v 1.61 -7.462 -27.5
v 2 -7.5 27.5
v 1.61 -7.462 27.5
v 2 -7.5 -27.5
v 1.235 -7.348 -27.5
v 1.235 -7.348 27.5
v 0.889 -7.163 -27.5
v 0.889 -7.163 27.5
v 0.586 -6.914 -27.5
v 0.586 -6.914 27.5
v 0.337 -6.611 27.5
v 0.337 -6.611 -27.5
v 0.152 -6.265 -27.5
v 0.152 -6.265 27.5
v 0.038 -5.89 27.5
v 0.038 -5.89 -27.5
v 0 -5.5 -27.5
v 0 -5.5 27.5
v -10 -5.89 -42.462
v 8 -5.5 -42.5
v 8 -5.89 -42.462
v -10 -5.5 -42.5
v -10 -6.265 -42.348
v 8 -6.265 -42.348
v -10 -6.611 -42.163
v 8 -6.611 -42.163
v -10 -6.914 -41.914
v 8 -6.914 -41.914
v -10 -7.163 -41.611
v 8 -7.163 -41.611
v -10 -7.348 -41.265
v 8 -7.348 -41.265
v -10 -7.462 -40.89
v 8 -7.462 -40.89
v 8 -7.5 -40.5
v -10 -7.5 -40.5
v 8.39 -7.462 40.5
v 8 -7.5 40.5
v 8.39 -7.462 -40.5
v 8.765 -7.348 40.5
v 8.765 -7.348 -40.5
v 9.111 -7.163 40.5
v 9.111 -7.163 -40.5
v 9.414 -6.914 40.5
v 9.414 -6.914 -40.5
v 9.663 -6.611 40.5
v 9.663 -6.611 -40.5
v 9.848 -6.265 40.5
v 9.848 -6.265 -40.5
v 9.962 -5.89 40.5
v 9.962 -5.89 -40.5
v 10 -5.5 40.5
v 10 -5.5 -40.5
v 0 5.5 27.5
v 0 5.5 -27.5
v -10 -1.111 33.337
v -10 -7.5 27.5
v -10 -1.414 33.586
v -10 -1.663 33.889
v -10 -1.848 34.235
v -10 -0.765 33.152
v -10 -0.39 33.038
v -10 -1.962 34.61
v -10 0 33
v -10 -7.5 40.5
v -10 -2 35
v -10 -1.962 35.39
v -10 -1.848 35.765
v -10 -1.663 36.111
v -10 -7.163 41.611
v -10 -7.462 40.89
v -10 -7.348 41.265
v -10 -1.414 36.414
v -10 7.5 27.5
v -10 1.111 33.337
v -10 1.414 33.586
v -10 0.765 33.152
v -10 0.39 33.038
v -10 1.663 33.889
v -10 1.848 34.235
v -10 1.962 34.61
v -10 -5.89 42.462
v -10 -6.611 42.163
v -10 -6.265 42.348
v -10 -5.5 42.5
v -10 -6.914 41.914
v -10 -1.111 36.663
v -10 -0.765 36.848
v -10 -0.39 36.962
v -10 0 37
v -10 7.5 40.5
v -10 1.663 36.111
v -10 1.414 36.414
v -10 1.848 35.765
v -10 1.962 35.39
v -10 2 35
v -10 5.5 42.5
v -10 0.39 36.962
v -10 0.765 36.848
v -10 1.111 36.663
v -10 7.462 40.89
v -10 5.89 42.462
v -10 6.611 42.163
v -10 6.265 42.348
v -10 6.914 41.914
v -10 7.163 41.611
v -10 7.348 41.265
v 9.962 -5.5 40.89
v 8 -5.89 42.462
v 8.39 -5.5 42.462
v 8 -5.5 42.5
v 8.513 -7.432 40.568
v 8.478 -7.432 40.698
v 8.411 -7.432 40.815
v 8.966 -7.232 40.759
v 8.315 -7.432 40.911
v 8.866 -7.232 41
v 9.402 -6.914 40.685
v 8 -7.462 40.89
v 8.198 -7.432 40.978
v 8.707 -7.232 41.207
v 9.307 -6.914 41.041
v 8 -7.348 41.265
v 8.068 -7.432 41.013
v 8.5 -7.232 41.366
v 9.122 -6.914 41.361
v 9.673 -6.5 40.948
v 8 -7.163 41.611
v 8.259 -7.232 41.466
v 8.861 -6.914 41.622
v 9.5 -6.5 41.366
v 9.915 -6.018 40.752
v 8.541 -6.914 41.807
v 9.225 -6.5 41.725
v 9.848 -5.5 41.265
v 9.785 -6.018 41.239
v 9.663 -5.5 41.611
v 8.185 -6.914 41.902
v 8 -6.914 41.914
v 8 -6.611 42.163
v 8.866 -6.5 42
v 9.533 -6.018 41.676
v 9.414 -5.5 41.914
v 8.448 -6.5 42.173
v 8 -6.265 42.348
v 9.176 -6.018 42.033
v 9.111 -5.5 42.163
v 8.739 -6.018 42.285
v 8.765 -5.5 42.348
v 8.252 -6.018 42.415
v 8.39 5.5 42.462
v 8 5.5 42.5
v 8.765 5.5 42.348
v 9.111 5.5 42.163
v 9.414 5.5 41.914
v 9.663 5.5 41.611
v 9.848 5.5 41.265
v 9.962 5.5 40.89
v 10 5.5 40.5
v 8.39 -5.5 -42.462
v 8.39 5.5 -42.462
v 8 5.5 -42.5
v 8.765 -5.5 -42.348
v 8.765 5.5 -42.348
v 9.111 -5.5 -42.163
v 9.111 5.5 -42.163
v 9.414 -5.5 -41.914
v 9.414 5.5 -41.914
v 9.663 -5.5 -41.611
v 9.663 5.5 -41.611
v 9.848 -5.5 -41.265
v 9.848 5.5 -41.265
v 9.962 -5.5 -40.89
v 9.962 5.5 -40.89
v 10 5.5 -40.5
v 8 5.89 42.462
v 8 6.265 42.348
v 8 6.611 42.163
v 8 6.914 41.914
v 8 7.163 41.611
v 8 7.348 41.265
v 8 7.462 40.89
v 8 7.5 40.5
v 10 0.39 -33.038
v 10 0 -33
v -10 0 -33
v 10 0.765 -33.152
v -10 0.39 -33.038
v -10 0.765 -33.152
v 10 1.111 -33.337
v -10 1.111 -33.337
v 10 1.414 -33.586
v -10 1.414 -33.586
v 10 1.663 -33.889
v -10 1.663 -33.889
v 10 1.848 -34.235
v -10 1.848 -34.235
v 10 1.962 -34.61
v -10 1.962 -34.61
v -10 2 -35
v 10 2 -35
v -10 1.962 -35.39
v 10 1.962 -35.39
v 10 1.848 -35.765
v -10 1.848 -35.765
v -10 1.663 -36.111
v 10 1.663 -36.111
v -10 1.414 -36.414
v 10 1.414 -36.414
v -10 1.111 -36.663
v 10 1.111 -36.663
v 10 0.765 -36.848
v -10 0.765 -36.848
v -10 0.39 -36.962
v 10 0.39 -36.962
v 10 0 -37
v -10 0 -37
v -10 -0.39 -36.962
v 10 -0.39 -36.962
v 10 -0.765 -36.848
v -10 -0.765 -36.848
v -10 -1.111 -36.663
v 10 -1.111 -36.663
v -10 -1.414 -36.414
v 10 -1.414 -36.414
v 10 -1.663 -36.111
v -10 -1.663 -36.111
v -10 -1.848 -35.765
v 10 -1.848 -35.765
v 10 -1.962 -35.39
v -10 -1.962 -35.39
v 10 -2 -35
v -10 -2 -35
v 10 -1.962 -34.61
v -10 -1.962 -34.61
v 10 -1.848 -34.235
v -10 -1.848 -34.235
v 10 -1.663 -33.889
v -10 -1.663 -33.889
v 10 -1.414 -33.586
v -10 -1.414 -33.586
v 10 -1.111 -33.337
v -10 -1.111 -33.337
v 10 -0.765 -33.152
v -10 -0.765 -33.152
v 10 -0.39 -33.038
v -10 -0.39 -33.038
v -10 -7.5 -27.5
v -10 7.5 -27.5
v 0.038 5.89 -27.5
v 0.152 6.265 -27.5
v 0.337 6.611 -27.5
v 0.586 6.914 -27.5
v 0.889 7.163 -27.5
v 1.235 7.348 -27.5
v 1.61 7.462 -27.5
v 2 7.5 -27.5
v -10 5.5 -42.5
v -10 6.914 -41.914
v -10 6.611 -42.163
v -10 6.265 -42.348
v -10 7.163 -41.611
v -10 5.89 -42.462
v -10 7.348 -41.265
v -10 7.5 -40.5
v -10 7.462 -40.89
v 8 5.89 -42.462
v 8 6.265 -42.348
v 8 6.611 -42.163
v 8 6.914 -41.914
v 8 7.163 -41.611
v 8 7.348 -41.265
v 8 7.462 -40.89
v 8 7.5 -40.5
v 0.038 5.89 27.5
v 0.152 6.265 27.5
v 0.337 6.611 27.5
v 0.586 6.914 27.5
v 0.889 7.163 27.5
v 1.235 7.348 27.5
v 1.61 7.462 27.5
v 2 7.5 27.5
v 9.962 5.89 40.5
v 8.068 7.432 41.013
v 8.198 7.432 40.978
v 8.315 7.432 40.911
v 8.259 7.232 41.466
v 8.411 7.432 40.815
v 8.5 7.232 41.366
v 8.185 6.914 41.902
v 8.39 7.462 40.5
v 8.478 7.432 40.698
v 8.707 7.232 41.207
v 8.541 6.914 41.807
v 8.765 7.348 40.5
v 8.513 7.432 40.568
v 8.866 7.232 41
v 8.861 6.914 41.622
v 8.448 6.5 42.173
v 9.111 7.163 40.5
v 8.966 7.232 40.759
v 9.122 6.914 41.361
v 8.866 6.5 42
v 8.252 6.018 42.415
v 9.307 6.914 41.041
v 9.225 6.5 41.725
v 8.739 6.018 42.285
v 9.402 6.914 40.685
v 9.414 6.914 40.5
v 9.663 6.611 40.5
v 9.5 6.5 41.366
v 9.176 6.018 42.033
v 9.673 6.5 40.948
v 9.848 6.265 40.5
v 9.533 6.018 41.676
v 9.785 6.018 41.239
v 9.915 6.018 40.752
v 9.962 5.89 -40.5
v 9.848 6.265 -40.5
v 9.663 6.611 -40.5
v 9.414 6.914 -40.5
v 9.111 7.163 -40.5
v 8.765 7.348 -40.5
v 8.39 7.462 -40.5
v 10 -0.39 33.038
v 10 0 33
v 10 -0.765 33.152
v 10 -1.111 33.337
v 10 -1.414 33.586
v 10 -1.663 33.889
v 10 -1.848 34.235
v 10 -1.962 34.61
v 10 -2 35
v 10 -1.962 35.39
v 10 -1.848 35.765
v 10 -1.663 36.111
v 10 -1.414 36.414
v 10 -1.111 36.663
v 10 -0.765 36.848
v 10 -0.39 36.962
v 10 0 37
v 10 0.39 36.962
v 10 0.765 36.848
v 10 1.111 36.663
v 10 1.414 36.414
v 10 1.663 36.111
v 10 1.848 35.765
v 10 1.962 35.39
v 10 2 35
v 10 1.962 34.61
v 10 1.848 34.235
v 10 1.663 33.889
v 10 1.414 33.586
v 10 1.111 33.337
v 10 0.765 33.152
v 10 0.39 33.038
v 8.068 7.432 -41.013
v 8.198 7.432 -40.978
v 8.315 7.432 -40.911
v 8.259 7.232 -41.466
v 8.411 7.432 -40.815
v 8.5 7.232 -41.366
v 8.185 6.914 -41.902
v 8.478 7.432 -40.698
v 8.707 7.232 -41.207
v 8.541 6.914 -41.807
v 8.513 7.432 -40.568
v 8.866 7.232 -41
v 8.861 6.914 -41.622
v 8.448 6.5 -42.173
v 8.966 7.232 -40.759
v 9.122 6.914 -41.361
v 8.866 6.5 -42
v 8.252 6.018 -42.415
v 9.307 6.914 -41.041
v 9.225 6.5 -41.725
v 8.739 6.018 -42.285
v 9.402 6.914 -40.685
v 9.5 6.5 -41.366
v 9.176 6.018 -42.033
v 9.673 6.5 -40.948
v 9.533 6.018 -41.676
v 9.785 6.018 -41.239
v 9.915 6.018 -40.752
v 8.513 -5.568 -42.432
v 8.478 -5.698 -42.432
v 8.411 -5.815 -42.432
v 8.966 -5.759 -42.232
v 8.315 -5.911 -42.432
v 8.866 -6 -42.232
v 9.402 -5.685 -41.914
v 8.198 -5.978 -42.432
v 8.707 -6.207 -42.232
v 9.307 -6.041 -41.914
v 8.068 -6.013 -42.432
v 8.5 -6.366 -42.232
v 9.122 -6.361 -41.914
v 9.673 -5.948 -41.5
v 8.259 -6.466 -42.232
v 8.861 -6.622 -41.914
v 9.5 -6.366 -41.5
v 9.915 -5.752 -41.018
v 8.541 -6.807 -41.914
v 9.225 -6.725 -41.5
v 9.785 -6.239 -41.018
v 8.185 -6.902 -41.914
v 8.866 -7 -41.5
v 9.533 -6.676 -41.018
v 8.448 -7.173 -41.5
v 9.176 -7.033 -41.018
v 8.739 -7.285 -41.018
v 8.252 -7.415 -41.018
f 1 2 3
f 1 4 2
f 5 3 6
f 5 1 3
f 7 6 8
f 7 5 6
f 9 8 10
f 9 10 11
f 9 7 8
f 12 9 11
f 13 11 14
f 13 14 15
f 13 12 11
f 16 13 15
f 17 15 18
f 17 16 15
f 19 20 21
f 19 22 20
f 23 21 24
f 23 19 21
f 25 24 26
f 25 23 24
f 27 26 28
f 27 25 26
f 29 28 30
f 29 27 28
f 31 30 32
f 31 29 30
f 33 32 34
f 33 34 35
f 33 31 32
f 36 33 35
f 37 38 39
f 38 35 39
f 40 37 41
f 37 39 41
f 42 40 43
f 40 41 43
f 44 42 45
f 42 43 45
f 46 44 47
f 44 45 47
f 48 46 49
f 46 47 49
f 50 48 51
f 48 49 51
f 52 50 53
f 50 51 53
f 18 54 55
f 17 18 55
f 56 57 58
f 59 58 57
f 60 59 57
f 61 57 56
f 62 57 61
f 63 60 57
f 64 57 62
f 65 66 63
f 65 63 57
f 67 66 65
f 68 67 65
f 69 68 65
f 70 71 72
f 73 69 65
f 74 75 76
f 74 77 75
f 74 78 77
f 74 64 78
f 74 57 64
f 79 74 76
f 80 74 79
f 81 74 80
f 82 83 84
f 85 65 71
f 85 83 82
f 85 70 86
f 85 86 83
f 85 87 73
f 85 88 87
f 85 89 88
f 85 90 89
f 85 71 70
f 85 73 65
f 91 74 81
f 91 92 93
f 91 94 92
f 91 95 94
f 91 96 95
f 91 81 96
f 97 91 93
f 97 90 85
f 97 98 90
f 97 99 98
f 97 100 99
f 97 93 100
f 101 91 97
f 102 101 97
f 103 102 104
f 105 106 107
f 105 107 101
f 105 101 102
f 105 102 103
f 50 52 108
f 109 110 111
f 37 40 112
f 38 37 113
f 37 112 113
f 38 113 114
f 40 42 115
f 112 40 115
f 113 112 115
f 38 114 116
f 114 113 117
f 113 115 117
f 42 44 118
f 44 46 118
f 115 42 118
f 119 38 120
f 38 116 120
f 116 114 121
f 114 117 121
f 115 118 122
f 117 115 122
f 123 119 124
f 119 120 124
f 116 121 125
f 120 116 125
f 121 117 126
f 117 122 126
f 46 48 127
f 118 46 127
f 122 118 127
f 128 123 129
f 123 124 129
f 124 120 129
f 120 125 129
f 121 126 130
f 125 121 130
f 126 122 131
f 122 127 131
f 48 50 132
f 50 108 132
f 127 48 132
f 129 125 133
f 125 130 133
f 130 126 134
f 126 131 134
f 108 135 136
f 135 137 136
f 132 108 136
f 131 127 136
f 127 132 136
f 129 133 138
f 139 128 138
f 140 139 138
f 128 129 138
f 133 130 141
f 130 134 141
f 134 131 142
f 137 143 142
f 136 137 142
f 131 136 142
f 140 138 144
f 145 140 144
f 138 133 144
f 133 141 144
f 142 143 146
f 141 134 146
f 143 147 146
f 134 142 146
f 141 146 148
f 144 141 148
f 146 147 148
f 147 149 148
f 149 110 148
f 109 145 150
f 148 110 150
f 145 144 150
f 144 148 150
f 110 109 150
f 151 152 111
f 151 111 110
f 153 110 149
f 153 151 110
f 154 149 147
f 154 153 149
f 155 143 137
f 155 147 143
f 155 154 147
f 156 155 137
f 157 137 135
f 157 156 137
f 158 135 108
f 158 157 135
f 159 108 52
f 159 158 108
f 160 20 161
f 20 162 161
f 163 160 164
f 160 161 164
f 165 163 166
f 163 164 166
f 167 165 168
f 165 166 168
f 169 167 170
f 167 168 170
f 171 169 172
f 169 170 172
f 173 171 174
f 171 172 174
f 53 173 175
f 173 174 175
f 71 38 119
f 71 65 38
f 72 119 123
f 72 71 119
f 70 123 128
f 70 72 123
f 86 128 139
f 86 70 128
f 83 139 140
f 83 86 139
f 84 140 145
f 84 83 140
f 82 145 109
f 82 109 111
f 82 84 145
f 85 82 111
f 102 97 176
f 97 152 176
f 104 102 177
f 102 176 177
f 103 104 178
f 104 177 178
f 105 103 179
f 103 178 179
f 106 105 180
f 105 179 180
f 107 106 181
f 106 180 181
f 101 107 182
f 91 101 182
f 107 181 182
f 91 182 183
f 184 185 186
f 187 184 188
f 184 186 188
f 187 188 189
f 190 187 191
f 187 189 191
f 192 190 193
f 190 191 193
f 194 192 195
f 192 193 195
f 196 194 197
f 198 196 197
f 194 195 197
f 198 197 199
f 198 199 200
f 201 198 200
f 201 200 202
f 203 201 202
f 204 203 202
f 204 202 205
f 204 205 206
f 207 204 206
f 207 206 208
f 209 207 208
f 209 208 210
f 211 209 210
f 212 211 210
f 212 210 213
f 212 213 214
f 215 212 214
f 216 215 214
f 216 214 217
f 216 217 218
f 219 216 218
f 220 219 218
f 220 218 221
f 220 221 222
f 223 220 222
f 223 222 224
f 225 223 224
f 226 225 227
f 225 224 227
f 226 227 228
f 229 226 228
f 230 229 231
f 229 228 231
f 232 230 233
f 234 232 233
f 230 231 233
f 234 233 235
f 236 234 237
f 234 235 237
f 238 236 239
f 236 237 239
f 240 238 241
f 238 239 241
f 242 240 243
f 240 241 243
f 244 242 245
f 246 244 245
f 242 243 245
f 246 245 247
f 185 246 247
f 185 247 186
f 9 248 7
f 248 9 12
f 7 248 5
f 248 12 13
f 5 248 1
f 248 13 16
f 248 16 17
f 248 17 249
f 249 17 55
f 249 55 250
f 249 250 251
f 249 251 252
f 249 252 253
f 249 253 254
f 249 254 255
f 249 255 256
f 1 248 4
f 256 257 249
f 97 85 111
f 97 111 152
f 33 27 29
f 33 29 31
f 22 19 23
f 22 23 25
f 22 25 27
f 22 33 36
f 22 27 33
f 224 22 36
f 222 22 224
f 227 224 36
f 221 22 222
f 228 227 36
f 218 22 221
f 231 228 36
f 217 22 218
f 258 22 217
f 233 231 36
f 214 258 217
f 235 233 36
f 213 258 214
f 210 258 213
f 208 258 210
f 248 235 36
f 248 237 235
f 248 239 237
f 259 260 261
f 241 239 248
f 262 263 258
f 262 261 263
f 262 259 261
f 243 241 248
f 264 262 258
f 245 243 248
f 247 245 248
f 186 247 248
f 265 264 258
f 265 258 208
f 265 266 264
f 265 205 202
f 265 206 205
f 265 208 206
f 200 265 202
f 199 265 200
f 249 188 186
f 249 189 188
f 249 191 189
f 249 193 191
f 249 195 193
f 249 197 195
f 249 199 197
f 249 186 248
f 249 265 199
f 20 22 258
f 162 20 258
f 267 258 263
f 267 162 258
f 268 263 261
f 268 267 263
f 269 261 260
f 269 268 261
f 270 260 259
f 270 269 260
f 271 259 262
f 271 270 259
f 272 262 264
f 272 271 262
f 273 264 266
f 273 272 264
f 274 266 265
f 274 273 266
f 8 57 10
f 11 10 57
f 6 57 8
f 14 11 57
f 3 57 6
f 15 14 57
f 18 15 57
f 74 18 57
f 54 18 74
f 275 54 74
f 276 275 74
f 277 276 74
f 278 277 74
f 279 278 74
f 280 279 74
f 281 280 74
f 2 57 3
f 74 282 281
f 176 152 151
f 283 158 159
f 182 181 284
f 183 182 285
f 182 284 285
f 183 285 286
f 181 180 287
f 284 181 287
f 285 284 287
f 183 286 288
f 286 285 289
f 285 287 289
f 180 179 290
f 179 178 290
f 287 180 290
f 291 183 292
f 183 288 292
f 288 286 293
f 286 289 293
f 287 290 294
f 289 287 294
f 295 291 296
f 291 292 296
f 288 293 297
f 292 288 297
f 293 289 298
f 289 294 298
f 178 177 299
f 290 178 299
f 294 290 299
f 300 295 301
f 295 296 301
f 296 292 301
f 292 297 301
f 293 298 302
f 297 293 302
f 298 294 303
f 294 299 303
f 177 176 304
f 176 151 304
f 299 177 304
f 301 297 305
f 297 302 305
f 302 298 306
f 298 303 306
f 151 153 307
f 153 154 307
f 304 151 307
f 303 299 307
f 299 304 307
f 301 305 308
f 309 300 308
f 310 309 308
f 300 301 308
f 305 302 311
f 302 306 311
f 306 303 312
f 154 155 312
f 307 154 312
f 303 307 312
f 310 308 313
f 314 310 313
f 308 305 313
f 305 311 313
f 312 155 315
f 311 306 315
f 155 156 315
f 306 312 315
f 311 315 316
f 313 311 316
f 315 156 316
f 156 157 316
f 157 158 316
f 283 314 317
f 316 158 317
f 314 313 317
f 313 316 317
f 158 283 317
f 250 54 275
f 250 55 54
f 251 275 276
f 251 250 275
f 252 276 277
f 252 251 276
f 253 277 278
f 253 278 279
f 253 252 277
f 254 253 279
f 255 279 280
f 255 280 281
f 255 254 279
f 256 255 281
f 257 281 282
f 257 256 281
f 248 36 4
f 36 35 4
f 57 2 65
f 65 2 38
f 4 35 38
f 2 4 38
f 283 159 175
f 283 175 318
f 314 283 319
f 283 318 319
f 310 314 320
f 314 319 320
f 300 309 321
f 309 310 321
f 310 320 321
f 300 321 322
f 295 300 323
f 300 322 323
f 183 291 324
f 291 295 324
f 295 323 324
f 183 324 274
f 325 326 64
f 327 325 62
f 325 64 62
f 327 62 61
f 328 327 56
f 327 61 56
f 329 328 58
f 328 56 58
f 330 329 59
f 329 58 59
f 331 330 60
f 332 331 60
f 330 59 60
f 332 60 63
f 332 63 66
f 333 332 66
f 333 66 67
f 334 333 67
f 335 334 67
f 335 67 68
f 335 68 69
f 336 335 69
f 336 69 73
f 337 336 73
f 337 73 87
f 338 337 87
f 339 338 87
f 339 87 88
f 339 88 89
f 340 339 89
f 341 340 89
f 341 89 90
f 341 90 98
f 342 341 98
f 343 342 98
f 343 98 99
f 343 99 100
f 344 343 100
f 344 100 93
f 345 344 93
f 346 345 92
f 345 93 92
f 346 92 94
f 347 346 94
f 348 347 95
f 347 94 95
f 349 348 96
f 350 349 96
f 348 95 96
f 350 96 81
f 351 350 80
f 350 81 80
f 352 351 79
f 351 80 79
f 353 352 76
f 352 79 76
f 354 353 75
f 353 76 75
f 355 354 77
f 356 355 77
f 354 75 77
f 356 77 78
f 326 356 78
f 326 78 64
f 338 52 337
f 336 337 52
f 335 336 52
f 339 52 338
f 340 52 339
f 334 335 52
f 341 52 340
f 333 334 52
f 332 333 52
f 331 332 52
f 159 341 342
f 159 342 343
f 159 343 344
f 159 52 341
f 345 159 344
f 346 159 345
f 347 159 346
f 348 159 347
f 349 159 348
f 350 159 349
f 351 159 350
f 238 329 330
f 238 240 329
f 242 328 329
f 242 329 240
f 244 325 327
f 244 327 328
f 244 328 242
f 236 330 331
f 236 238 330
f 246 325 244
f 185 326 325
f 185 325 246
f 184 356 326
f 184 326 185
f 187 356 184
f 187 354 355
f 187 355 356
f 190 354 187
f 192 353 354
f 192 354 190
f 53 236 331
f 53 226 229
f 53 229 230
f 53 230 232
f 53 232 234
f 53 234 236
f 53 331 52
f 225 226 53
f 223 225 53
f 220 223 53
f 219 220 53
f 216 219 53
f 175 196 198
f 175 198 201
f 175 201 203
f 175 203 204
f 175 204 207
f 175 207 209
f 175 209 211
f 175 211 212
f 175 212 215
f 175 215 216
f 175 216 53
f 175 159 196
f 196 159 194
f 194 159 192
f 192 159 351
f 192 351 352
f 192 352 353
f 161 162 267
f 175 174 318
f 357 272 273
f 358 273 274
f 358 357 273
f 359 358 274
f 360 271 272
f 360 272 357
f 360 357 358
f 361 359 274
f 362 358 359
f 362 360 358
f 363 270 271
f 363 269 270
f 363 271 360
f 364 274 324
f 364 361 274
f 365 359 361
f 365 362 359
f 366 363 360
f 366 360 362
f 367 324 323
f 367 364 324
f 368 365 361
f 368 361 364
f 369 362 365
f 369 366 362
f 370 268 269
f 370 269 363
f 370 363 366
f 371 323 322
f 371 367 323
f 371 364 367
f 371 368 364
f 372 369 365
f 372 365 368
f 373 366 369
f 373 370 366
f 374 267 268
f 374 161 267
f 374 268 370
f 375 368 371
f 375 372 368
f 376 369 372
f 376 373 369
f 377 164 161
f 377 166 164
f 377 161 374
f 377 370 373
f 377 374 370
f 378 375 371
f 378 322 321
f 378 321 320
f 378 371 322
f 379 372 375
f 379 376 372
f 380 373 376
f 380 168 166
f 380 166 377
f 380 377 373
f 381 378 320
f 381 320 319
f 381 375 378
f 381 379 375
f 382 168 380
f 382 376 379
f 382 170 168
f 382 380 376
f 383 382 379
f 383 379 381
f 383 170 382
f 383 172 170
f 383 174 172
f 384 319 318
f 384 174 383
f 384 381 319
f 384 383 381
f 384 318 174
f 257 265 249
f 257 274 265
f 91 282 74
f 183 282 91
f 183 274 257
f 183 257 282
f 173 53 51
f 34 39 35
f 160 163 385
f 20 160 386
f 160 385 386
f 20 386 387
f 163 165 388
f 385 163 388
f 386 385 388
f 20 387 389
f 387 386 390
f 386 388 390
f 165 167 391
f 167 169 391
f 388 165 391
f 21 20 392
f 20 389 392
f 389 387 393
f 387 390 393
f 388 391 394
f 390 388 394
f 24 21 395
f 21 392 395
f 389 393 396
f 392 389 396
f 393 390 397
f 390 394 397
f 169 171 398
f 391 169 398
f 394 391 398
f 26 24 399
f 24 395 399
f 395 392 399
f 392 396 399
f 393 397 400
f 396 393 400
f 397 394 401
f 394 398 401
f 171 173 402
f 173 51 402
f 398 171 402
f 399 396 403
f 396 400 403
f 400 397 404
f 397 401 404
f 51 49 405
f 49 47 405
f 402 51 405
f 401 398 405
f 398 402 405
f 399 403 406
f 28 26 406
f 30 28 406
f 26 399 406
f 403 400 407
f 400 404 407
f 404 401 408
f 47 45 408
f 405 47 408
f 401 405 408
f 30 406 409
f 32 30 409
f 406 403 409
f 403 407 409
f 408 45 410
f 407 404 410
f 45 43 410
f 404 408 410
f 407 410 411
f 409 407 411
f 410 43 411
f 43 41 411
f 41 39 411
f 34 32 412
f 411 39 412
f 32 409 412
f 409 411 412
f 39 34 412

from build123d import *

# Parameters (mm, degrees)
SKETCH1_W           = 85
SKETCH1_H           = 15
BOSS_EXTRUDE1_DEPTH = 10
SKETCH2_W           = 15
SKETCH2_H           = 15
BOSS_EXTRUDE2_DEPTH = 10
FILLET3_R           = 2
SKETCH3_R           = 2
CUT_EXTRUDE1_DEPTH  = 48.565743976


with BuildPart() as part:
    # Sketch1 → Boss-Extrude1 (new body)
    with BuildSketch(Plane(origin=(0, 0, 0), x_dir=(0, 0, -1), z_dir=(1, 0, 0))):
        Rectangle(SKETCH1_W, SKETCH1_H)
    extrude(amount=BOSS_EXTRUDE1_DEPTH)

    # Sketch2 → Boss-Extrude2 (add)
    with BuildSketch(Plane.ZY):
        with Locations((-35, 0)):
            Rectangle(SKETCH2_W, SKETCH2_H)
        with Locations((35, 0)):
            Rectangle(SKETCH2_W, SKETCH2_H)
    extrude(amount=BOSS_EXTRUDE2_DEPTH)

    # Fillet3
    fillet3_edges = [part.edges().sort_by_distance(p)[0] for p in [
        (10, 0, 42.5),
        (0, -7.5, 0),
        (0, 7.5, 0),
        (10, -7.5, 0),
        (10, 0, -42.5),
        (0, -7.5, -42.5),
        (0, -7.5, 42.5),
        (0, 7.5, 42.5),
        (0, 7.5, -42.5),
        (10, 7.5, 0),
    ]]
    fillet(fillet3_edges, radius=FILLET3_R)

    # Sketch3 → Cut-Extrude1 (cut, through all)
    with BuildSketch(Plane.ZY.offset(10)):
        with Locations((-35, 0)):
            Circle(SKETCH3_R)
        with Locations(Location((35, 0, 0), (0, 0, 180))):
            Circle(SKETCH3_R)
    extrude(amount=-CUT_EXTRUDE1_DEPTH, mode=Mode.SUBTRACT)


solid = part.part
